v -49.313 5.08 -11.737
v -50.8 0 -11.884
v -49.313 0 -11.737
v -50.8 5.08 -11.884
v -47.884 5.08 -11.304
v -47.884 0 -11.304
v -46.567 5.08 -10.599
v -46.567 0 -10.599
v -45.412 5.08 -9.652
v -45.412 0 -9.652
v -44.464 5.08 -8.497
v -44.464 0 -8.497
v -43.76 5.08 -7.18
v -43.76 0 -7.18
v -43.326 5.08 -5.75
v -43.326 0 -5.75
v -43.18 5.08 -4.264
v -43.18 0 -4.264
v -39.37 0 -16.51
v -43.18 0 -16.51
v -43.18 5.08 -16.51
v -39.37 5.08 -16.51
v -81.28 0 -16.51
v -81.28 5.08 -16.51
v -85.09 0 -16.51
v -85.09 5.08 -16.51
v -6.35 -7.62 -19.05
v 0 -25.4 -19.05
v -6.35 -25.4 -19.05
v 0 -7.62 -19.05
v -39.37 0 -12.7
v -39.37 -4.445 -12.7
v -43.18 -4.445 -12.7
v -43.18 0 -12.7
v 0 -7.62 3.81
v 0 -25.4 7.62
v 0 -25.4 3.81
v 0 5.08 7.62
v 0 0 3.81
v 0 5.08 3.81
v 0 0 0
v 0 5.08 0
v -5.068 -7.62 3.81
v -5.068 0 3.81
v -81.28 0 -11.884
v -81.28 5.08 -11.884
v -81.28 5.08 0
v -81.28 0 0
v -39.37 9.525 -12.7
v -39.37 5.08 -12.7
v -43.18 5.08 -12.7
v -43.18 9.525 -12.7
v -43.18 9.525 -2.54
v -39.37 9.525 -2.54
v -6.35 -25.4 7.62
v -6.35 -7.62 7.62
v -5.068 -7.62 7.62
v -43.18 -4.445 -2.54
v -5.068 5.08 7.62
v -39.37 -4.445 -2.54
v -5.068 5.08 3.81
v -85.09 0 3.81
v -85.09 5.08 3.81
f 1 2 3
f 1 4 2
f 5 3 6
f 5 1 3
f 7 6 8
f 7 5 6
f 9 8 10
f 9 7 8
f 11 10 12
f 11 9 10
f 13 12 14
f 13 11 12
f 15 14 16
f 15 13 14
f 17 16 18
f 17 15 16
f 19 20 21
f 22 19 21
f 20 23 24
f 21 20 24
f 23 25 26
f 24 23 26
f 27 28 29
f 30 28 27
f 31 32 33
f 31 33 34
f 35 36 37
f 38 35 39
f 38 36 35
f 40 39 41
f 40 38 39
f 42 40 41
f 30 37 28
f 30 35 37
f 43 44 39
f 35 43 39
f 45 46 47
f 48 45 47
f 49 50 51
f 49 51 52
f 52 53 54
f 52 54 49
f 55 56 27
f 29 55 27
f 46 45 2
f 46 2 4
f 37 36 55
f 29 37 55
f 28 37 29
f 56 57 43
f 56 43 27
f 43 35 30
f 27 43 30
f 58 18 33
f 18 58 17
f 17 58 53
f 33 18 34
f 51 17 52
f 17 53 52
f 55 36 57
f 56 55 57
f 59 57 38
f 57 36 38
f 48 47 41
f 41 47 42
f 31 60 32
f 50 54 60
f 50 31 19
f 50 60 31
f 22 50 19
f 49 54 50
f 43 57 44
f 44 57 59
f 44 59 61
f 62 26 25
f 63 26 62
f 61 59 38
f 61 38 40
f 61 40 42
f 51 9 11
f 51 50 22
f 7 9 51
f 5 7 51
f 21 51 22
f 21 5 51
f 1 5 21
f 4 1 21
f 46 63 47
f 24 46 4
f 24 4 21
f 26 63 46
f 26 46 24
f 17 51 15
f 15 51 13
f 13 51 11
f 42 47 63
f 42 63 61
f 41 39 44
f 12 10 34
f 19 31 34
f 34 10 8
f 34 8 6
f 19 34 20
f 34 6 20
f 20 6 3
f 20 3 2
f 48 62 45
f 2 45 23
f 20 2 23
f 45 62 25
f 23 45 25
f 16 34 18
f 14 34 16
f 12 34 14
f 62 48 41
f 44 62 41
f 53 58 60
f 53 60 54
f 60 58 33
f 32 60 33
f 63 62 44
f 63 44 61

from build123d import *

# Parameters (mm, degrees)
SKETCH1_W           = 81.28
SKETCH1_H           = 5.08
BOSS_EXTRUDE1_DEPTH = 3.81
SKETCH3_W           = 5.067533081
SKETCH3_H           = 3.81
BOSS_EXTRUDE2_DEPTH = 30.48
SKETCH4_W           = 26.67
SKETCH4_H           = 17.78
BOSS_EXTRUDE3_DEPTH = 6.35
SKETCH6_W           = 20.32
SKETCH6_H           = 5.08
BOSS_EXTRUDE4_DEPTH = 3.81
SKETCH7_W           = 4.626355507
SKETCH7_H           = 5.08
BOSS_EXTRUDE5_DEPTH = 38.1
SKETCH8_W           = 13.97
SKETCH8_H           = 13.97
BOSS_EXTRUDE6_DEPTH = 3.81
SKETCH9_W           = 3.81
SKETCH9_H           = 4.445
CUT_EXTRUDE1_DEPTH  = 56.663101782
FILLET1_R           = 7.62


with BuildPart() as part:
    # Sketch1 → Boss-Extrude1 (new body)
    with BuildSketch(Plane.XY):
        with Locations((-40.64, 2.54)):
            Rectangle(SKETCH1_W, SKETCH1_H)
    extrude(amount=BOSS_EXTRUDE1_DEPTH)

    # Sketch3 → Boss-Extrude2 (add)
    with BuildSketch(Plane(origin=(0, 5.08, 0), x_dir=(1, 0, 0), z_dir=(0, 1, 0))):
        with Locations((-2.533766541, -5.715)):
            Rectangle(SKETCH3_W, SKETCH3_H)
    extrude(amount=-BOSS_EXTRUDE2_DEPTH)

    # Sketch4 → Boss-Extrude3 (add)
    with BuildSketch(Plane(origin=(0, 0, 0), x_dir=(0, 0, -1), z_dir=(1, 0, 0))):
        with Locations((5.715, -16.51)):
            Rectangle(SKETCH4_W, SKETCH4_H)
    extrude(amount=-BOSS_EXTRUDE3_DEPTH)

    # Sketch6 → Boss-Extrude4 (add)
    with BuildSketch(Plane.ZY.offset(81.28)):
        with Locations((-6.35, 2.54)):
            Rectangle(SKETCH6_W, SKETCH6_H)
    extrude(amount=BOSS_EXTRUDE4_DEPTH)

    # Sketch7 → Boss-Extrude5 (add)
    with BuildSketch(Plane(origin=(-81.28, 0, 0), x_dir=(0, 0, -1), z_dir=(1, 0, 0))):
        with Locations((14.196822247, 2.54)):
            Rectangle(SKETCH7_W, SKETCH7_H)
    extrude(amount=BOSS_EXTRUDE5_DEPTH)

    # Sketch8 → Boss-Extrude6 (add)
    with BuildSketch(Plane(origin=(-43.18, 0, 0), x_dir=(0, 0, -1), z_dir=(1, 0, 0))):
        with Locations((9.525, 2.54)):
            Rectangle(SKETCH8_W, SKETCH8_H)
    extrude(amount=BOSS_EXTRUDE6_DEPTH)

    # Sketch9 → Cut-Extrude1 (cut, through all)
    with BuildSketch(Plane(origin=(-39.37, 0, 0), x_dir=(0, 0, -1), z_dir=(1, 0, 0))):
        with Locations((14.605, -2.2225)):
            Rectangle(SKETCH9_W, SKETCH9_H)
        with Locations((14.605, 7.3025)):
            Rectangle(SKETCH9_W, SKETCH9_H)
    extrude(amount=-CUT_EXTRUDE1_DEPTH, mode=Mode.SUBTRACT)

    # Fillet1
    fillet1_edges = [part.edges().sort_by_distance(p)[0] for p in [
        (-43.18, 2.54, -11.883644493),
    ]]
    fillet(fillet1_edges, radius=FILLET1_R)


solid = part.part
